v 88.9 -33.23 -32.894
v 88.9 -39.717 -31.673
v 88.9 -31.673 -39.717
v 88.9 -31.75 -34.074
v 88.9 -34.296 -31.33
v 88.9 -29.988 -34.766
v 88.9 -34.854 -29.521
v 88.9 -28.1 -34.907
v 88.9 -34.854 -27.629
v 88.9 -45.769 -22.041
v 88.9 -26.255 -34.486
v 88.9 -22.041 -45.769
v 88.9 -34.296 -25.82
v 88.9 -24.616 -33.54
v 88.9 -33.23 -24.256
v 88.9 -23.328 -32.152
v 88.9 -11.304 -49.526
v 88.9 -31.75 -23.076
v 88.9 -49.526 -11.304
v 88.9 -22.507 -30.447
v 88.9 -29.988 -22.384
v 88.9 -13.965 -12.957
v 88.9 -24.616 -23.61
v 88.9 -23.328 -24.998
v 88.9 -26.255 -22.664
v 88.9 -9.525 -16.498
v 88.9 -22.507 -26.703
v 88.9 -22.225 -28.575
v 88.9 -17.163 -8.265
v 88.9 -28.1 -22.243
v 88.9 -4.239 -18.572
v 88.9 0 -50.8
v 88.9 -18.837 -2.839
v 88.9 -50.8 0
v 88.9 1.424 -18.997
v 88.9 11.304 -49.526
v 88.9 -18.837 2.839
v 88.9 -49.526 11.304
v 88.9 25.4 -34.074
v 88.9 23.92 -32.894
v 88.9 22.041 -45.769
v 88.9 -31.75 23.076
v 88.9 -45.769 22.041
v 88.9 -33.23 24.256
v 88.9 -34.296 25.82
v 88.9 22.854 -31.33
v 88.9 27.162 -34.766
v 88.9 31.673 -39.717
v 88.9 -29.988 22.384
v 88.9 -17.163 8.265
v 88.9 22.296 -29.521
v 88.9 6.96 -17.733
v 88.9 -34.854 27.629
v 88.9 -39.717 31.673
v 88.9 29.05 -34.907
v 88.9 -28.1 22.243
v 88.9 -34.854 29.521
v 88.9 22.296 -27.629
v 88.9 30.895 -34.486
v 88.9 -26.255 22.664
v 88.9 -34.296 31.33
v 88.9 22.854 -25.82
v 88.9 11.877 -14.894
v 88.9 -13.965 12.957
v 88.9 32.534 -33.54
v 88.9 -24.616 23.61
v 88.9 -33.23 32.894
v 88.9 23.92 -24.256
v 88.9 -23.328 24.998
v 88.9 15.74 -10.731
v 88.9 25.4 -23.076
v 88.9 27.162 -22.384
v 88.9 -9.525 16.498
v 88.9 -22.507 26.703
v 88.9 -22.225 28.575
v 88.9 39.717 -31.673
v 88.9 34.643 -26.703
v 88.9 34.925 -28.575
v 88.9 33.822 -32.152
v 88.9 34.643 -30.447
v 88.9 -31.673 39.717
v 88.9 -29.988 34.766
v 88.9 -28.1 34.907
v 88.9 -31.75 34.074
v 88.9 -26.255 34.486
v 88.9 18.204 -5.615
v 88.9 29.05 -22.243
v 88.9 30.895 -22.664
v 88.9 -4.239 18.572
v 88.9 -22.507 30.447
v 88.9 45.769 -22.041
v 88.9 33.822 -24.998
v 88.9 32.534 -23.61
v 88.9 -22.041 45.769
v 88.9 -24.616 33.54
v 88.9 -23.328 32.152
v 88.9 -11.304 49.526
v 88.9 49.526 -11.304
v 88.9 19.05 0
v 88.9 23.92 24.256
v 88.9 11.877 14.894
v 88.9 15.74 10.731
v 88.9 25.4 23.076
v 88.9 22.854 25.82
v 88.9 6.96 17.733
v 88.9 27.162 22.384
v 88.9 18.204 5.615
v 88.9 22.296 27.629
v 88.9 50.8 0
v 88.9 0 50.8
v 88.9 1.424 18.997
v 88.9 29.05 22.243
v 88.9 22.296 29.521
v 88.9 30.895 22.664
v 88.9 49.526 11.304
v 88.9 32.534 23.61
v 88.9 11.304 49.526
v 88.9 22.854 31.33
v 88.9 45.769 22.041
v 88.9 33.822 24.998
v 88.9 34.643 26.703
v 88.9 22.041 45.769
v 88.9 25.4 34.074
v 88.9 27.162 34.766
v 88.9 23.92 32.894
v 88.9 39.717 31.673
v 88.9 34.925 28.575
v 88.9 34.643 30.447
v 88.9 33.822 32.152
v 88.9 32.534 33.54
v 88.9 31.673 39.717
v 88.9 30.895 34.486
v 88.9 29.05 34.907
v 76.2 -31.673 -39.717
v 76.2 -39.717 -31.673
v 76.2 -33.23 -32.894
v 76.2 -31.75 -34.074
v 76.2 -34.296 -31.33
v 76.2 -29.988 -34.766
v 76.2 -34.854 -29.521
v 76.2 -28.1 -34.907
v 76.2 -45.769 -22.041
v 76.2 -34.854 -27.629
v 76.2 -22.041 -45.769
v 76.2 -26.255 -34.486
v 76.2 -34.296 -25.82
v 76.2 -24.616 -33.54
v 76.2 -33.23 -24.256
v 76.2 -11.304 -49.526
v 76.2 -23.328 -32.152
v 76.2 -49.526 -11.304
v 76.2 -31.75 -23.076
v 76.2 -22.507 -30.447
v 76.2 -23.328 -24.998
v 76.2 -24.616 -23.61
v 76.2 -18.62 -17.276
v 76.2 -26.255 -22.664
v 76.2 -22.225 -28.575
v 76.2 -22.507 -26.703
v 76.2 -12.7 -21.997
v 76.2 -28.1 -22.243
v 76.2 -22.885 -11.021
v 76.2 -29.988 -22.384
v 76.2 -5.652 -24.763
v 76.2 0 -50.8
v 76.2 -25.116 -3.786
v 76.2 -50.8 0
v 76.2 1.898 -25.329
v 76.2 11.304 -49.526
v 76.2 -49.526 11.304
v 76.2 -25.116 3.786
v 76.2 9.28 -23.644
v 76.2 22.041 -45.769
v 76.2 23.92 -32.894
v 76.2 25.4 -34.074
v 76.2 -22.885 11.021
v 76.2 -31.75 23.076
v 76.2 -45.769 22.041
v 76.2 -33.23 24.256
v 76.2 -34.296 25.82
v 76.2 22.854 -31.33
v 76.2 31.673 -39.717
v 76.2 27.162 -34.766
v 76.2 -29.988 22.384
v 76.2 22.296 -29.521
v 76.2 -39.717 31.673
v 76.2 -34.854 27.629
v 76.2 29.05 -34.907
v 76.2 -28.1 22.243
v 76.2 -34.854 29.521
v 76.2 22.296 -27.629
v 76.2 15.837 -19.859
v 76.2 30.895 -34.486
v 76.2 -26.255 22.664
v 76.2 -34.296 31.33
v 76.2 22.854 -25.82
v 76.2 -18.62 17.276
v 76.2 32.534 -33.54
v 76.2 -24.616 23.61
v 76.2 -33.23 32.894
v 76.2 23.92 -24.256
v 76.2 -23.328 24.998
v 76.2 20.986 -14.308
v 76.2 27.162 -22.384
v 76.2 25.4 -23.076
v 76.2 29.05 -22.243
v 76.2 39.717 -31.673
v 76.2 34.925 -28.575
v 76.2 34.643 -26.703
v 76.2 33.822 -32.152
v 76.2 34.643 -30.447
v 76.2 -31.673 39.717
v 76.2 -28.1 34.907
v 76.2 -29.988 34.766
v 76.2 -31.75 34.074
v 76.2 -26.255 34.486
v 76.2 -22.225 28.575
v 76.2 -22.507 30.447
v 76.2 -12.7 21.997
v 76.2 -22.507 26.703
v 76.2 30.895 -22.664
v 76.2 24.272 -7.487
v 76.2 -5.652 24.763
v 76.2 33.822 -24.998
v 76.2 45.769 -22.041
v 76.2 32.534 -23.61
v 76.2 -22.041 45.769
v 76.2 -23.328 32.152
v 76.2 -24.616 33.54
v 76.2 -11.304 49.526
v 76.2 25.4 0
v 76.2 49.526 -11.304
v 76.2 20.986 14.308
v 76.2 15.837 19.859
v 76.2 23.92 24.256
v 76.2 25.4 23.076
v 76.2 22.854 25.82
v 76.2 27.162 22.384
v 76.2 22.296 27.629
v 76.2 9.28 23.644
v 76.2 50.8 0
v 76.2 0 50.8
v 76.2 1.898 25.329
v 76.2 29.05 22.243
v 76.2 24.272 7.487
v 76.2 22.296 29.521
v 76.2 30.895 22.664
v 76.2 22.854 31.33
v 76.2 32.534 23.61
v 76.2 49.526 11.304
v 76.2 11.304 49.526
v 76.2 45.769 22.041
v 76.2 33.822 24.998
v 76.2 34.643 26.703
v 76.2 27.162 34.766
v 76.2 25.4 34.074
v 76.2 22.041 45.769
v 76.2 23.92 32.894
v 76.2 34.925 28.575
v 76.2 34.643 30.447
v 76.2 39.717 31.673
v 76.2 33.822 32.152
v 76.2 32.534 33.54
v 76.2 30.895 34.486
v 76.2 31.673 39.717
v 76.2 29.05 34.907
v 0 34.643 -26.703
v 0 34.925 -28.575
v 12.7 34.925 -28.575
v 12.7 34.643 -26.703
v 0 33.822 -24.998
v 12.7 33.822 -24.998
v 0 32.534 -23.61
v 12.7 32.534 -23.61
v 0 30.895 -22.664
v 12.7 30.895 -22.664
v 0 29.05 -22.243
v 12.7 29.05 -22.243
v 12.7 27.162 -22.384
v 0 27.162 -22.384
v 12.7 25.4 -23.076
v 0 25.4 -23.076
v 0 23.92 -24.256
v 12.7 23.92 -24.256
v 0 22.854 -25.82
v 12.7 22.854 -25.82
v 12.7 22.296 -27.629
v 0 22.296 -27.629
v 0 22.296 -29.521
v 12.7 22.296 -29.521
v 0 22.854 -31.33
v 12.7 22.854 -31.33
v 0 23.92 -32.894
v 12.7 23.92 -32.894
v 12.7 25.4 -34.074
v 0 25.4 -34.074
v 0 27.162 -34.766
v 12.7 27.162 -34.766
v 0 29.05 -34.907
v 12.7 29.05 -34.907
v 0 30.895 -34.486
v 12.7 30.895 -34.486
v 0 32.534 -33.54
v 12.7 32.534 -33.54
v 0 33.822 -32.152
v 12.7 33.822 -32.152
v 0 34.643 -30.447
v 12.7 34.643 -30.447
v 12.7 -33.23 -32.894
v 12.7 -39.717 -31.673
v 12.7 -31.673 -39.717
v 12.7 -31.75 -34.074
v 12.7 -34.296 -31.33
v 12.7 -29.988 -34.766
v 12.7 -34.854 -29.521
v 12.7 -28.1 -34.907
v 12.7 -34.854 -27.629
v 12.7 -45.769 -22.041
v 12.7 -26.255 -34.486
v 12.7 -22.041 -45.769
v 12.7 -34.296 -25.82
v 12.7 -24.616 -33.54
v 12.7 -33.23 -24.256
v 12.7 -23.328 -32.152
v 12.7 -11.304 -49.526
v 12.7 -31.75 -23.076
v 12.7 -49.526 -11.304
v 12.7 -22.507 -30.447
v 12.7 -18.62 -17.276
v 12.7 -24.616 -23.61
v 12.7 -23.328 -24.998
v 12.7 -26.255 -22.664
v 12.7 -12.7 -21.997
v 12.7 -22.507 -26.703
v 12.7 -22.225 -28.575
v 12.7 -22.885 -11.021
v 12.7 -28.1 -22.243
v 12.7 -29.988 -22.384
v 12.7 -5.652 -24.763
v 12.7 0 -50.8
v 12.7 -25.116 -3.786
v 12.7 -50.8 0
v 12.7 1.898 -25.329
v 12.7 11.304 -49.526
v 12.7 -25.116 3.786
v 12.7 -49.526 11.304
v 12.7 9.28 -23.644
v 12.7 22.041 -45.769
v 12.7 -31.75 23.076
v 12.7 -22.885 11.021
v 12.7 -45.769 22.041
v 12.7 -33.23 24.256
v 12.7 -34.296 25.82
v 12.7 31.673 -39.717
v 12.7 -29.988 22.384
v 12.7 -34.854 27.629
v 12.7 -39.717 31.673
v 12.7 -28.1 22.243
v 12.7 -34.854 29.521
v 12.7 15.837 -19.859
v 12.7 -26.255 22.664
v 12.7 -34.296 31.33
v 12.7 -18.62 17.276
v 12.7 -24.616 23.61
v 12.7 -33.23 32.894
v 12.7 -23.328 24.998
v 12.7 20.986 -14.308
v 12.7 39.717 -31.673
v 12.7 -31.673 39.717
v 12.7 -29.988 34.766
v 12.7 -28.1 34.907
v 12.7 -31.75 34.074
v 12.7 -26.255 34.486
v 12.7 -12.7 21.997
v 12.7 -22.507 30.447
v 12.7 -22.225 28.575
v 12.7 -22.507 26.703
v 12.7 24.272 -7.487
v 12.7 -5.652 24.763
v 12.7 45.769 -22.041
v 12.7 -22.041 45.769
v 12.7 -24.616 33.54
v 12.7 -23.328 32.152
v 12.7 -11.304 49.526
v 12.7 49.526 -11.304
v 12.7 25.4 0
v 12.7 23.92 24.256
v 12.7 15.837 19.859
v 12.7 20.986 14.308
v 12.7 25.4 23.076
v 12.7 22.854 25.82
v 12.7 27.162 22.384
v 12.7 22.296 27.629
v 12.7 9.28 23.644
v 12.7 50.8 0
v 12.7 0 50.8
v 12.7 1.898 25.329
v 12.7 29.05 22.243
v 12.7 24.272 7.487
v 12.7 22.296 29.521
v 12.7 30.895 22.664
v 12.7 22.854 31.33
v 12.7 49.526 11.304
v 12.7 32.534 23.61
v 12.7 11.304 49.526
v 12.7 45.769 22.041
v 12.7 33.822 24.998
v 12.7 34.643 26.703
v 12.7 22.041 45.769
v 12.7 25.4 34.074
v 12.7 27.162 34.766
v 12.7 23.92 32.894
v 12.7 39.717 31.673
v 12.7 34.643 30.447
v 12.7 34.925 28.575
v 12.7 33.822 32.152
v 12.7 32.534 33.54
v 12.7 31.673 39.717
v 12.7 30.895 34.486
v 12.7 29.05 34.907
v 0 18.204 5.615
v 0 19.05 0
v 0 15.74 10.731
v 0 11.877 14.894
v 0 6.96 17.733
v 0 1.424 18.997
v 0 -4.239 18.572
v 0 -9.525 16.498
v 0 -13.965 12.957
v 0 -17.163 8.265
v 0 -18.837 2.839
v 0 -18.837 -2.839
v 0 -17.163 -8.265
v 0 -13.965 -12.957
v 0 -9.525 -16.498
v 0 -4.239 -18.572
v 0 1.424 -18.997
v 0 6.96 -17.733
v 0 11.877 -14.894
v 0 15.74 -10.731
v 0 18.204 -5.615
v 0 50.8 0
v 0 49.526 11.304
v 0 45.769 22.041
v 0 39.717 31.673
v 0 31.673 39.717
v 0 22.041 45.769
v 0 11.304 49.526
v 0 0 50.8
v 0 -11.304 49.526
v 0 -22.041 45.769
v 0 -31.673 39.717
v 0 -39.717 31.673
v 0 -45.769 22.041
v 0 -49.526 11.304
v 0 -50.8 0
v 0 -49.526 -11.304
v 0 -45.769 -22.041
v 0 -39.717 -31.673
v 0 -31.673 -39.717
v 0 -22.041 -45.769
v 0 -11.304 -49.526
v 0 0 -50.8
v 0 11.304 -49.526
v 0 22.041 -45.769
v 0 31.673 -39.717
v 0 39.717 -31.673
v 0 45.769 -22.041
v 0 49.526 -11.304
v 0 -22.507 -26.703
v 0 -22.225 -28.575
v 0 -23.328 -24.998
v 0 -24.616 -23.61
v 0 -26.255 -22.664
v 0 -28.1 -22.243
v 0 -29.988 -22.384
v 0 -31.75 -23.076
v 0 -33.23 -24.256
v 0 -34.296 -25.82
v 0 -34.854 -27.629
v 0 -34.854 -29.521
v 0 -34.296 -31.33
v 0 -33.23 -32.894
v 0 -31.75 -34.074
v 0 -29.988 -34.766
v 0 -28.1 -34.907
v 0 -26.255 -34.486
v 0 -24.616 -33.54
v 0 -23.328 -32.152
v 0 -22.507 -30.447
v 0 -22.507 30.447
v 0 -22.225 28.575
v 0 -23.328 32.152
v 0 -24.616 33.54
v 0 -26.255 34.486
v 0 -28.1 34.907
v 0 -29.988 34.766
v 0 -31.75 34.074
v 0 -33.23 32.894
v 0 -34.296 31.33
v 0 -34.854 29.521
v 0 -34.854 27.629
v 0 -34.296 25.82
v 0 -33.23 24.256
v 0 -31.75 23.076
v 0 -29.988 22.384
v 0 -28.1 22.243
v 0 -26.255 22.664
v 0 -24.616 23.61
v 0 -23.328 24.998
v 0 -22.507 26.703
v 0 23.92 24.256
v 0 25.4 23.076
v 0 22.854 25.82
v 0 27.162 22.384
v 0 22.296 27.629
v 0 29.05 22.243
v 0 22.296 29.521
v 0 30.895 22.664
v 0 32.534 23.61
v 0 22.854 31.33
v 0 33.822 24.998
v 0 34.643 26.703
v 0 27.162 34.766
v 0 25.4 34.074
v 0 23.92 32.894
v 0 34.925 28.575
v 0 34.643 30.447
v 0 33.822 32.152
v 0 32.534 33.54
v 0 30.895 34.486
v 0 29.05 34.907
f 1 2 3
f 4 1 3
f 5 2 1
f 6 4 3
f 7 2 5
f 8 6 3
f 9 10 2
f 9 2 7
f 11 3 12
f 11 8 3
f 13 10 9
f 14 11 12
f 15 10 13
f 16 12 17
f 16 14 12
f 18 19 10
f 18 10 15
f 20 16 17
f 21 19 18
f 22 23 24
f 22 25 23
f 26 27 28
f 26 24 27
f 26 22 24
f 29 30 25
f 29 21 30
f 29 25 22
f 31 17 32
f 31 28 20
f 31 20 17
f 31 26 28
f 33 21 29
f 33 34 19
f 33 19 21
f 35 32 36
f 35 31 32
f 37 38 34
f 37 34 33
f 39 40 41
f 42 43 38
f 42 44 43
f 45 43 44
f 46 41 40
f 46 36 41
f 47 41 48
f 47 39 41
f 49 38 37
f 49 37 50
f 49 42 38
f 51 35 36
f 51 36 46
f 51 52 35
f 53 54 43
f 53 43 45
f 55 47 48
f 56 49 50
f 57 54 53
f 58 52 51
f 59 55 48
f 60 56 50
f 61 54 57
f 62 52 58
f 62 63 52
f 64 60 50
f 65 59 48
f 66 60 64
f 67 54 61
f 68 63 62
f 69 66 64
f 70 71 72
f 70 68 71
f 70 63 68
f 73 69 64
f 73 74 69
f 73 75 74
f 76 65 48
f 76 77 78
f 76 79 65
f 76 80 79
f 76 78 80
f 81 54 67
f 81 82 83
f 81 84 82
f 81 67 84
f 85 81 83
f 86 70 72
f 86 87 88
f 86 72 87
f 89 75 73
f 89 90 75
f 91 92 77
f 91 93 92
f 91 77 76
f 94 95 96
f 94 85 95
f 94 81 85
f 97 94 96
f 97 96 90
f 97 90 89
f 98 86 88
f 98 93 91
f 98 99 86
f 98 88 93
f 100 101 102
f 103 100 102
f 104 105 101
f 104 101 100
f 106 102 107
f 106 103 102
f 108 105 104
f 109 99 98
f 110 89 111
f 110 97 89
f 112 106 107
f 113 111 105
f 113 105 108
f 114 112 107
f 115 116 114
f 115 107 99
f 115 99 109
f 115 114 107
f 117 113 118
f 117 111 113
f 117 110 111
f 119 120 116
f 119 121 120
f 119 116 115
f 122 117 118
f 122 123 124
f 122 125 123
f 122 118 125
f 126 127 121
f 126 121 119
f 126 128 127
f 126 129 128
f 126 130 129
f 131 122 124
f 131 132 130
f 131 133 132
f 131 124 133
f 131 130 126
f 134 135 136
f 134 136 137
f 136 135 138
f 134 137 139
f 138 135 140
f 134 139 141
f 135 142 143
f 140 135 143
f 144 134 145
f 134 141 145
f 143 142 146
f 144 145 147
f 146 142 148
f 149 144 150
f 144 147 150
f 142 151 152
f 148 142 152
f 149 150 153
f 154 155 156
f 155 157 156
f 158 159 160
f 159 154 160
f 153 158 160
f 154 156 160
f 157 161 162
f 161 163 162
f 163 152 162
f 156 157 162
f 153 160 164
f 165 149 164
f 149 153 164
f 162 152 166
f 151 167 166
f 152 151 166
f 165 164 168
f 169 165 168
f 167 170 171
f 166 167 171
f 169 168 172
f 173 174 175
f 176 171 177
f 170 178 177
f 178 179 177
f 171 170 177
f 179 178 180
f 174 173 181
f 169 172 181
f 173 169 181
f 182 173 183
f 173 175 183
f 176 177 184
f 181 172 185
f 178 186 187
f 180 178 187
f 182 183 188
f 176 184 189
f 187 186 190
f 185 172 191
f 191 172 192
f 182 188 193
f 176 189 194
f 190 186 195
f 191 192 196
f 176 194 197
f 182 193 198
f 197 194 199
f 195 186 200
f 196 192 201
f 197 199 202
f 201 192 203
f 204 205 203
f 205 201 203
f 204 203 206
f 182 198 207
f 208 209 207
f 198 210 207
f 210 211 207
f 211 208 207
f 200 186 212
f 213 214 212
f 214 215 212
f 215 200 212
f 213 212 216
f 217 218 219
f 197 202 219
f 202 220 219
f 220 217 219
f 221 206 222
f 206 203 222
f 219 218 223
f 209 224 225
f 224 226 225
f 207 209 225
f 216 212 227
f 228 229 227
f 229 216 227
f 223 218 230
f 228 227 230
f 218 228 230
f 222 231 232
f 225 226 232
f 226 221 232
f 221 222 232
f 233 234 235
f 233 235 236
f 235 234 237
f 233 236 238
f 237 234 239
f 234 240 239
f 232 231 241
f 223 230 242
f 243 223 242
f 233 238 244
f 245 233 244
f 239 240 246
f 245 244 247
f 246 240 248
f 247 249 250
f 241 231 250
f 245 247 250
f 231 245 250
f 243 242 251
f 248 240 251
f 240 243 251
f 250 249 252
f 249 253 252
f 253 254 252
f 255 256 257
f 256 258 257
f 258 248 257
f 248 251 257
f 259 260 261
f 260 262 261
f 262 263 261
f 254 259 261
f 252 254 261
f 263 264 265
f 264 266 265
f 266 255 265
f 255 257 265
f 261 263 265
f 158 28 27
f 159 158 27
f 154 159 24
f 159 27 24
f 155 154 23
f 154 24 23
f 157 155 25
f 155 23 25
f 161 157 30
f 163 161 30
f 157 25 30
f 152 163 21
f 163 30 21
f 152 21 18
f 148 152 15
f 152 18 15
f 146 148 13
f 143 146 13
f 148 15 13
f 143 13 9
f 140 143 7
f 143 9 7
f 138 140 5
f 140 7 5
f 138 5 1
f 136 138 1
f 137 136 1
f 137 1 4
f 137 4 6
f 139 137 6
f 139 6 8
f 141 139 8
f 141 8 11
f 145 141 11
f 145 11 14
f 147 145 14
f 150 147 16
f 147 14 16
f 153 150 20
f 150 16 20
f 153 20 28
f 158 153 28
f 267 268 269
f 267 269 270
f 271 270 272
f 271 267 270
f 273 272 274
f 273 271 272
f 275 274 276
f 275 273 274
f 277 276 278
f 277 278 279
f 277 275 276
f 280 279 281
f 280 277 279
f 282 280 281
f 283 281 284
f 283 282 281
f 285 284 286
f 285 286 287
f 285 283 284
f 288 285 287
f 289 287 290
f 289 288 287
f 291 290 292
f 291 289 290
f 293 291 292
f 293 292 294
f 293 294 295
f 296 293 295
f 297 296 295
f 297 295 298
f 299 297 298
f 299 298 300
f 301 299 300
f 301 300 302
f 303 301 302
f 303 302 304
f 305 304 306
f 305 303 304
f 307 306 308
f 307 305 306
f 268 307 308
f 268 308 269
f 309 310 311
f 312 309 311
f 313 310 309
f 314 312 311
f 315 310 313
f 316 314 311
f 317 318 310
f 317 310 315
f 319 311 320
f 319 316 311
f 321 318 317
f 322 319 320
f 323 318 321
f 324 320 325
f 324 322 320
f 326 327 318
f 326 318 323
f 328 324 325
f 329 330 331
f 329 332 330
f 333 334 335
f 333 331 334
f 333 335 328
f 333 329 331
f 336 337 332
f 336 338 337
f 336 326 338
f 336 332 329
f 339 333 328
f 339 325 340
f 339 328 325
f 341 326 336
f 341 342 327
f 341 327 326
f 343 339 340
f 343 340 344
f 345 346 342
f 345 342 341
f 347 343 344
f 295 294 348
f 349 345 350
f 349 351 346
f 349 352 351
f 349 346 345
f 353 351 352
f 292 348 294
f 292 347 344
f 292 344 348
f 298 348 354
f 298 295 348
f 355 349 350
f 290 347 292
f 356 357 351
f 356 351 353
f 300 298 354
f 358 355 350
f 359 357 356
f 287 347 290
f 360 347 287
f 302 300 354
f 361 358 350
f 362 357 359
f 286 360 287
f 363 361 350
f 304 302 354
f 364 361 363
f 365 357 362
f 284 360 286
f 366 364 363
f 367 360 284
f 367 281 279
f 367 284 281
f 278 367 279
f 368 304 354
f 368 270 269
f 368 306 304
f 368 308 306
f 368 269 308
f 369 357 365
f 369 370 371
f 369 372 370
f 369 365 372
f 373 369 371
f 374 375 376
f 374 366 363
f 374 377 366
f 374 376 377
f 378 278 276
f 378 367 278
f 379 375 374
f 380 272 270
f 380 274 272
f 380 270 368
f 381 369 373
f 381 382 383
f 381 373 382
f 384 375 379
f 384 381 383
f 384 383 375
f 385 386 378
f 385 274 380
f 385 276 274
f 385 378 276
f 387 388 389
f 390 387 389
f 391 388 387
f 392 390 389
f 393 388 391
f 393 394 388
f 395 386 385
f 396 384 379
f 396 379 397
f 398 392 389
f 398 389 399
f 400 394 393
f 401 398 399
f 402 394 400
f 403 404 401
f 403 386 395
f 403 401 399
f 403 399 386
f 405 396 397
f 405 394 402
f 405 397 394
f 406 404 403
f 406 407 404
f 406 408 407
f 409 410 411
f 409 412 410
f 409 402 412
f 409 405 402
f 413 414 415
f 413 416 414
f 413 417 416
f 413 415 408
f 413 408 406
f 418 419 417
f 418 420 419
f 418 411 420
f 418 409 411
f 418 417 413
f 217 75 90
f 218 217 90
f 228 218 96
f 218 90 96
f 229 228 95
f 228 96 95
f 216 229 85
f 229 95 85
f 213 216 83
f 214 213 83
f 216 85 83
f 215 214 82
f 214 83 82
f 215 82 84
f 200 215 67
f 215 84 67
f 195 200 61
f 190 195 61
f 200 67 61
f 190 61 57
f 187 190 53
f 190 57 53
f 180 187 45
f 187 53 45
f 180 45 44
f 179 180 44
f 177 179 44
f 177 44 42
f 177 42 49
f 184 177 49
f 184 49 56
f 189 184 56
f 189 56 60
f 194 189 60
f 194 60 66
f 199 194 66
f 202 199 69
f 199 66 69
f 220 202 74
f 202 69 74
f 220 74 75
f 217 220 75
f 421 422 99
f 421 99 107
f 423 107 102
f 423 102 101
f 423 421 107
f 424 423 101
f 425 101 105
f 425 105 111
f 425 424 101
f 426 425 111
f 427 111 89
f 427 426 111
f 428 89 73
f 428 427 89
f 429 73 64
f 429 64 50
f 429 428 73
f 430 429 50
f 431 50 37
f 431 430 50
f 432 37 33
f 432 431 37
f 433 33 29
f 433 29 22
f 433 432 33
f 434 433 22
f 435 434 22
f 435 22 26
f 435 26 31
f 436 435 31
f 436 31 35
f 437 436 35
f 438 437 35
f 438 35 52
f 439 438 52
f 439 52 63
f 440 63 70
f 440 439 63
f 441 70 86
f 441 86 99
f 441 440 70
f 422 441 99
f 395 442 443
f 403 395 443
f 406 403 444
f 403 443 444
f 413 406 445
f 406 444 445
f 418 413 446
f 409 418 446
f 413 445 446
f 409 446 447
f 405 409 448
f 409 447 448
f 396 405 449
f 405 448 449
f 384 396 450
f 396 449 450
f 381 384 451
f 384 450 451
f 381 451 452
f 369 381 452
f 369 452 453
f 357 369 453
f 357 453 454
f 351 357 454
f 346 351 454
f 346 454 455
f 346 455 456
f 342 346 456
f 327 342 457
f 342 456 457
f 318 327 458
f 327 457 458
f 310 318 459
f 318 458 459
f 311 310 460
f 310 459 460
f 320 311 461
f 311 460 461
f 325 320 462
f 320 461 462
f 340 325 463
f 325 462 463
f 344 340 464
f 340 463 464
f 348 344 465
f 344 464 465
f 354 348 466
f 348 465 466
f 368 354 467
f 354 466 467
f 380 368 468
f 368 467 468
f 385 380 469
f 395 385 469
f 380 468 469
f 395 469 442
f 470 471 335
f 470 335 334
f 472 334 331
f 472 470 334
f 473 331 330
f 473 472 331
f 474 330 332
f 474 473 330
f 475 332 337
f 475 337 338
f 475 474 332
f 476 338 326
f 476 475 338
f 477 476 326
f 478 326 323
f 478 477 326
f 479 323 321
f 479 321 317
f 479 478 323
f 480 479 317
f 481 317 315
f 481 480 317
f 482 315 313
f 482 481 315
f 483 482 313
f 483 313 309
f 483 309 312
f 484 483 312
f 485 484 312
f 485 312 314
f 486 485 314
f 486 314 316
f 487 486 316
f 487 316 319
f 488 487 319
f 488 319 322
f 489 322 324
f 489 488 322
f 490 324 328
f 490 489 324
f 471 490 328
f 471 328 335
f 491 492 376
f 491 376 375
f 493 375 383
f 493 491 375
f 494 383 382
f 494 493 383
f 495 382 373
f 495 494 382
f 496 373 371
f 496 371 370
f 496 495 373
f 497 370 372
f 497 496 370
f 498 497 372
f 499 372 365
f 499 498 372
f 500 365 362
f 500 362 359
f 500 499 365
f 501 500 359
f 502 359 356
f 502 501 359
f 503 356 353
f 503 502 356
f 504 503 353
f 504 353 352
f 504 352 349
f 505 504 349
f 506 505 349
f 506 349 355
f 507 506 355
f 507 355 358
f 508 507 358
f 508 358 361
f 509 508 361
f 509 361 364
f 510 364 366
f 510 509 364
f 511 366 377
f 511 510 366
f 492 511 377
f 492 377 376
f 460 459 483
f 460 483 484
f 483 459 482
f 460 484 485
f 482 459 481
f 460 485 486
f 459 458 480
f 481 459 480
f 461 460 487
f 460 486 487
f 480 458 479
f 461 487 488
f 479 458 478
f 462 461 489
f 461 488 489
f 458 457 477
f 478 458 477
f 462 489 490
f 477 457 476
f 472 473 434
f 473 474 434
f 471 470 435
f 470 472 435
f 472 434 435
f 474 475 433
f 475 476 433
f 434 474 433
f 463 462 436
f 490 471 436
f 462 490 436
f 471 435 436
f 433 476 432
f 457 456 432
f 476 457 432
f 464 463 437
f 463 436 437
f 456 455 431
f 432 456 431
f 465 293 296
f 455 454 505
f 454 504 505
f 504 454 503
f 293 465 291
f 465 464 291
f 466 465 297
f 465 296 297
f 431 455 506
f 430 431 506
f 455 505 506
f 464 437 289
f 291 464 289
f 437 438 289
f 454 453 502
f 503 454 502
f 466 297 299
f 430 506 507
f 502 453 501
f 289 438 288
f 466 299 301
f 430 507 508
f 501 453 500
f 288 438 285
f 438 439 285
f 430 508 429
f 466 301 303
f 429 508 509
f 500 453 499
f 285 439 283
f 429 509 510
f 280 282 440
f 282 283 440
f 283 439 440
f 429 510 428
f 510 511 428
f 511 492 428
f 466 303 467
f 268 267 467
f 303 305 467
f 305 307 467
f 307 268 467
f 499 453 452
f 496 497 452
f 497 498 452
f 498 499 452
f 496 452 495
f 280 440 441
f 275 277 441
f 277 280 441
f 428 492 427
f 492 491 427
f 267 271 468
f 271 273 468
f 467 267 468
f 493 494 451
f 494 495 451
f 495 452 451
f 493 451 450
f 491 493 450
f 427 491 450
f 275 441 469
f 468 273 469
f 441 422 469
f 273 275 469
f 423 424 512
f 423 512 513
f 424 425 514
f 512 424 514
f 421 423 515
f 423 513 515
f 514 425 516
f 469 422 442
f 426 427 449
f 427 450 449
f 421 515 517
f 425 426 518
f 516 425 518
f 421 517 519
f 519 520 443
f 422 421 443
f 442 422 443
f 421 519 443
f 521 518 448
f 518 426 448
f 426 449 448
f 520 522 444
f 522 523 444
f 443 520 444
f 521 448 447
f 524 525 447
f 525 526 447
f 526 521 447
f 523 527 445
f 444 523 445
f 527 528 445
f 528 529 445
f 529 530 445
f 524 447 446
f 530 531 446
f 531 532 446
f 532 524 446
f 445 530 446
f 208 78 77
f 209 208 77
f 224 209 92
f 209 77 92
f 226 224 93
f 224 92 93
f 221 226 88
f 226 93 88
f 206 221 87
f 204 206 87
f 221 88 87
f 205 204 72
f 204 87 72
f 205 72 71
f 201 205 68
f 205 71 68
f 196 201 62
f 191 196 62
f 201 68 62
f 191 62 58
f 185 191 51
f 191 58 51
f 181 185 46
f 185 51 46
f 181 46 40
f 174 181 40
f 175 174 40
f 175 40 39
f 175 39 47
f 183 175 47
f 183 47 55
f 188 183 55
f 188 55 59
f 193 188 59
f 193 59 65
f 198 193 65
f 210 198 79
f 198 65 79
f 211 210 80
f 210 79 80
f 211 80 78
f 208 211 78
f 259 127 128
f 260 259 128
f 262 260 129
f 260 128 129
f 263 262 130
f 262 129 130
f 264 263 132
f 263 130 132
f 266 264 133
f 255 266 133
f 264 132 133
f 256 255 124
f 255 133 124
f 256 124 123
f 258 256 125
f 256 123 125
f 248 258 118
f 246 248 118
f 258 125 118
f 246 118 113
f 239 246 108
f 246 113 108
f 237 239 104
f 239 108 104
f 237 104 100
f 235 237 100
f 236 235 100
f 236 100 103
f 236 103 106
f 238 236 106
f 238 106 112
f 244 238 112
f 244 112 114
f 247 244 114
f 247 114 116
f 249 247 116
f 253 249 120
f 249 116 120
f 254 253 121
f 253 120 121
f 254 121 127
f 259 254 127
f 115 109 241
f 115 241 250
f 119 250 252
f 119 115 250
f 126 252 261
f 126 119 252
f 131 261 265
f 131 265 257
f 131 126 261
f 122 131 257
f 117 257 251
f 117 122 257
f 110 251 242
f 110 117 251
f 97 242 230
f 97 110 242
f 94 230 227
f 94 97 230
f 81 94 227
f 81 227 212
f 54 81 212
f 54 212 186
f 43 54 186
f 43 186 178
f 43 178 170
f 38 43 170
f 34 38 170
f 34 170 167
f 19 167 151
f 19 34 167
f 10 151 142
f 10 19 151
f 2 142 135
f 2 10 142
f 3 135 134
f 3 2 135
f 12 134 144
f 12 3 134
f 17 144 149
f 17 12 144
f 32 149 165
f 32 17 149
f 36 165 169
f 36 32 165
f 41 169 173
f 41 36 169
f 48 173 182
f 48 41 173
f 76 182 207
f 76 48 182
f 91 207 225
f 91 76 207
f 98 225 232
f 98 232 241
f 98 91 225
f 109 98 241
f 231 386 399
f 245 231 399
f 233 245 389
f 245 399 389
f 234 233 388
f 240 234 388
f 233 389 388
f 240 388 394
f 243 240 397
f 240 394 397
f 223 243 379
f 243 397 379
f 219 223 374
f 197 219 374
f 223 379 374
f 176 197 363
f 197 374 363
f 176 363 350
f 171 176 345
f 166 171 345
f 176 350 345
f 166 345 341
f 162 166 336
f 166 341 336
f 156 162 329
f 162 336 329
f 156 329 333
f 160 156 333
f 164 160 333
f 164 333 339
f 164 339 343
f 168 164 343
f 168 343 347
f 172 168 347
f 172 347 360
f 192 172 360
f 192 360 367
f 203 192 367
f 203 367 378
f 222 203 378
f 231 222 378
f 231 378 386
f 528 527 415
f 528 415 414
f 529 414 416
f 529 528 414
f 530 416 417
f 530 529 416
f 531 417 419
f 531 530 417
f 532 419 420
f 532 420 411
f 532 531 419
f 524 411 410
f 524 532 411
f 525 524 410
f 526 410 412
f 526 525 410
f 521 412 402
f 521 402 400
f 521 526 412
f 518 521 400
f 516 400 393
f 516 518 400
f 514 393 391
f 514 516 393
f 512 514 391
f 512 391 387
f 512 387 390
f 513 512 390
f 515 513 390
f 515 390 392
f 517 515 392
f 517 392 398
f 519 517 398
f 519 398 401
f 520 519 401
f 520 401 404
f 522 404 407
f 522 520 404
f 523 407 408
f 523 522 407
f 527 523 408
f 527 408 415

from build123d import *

# Parameters (mm, degrees)
F0_R     = 50.8
F0_R_2   = 6.35
F0_R_3   = 25.4
F1_DEPTH = 12.7
F0_R_4   = 19.05
F2_DEPTH = 88.9
F3_R     = 50.8
F3_R_2   = 6.35
F3_R_3   = 25.4
F4_DEPTH = 12.7


with BuildPart() as f1:
    # F0 (on Right) → F1 (new body)
    with BuildSketch(Plane.YZ):
        Circle(F0_R)
        with Locations((-28.575, -28.575)):
            Circle(F0_R_2, mode=Mode.SUBTRACT)
        Circle(F0_R_3, mode=Mode.SUBTRACT)
        with Locations((28.575, -28.575)):
            Circle(F0_R_2, mode=Mode.SUBTRACT)
        with Locations((-28.575, 28.575)):
            Circle(F0_R_2, mode=Mode.SUBTRACT)
        with Locations((28.575, 28.575)):
            Circle(F0_R_2, mode=Mode.SUBTRACT)
    extrude(amount=F1_DEPTH)

    # F0 (on Right) → F2 (join)
    with BuildSketch(Plane.YZ):
        Circle(F0_R_3)
        Circle(F0_R_4, mode=Mode.SUBTRACT)
    extrude(amount=F2_DEPTH)

    # F3 (on face) → F4 (join)
    with BuildSketch(Plane.YZ.offset(88.9)):
        Circle(F3_R)
        with Locations((-28.575, -28.575)):
            Circle(F3_R_2, mode=Mode.SUBTRACT)
        Circle(F3_R_3, mode=Mode.SUBTRACT)
        with Locations((28.575, -28.575)):
            Circle(F3_R_2, mode=Mode.SUBTRACT)
        with Locations((-28.575, 28.575)):
            Circle(F3_R_2, mode=Mode.SUBTRACT)
        with Locations((28.575, 28.575)):
            Circle(F3_R_2, mode=Mode.SUBTRACT)
    extrude(amount=-F4_DEPTH)


solid = f1.part
